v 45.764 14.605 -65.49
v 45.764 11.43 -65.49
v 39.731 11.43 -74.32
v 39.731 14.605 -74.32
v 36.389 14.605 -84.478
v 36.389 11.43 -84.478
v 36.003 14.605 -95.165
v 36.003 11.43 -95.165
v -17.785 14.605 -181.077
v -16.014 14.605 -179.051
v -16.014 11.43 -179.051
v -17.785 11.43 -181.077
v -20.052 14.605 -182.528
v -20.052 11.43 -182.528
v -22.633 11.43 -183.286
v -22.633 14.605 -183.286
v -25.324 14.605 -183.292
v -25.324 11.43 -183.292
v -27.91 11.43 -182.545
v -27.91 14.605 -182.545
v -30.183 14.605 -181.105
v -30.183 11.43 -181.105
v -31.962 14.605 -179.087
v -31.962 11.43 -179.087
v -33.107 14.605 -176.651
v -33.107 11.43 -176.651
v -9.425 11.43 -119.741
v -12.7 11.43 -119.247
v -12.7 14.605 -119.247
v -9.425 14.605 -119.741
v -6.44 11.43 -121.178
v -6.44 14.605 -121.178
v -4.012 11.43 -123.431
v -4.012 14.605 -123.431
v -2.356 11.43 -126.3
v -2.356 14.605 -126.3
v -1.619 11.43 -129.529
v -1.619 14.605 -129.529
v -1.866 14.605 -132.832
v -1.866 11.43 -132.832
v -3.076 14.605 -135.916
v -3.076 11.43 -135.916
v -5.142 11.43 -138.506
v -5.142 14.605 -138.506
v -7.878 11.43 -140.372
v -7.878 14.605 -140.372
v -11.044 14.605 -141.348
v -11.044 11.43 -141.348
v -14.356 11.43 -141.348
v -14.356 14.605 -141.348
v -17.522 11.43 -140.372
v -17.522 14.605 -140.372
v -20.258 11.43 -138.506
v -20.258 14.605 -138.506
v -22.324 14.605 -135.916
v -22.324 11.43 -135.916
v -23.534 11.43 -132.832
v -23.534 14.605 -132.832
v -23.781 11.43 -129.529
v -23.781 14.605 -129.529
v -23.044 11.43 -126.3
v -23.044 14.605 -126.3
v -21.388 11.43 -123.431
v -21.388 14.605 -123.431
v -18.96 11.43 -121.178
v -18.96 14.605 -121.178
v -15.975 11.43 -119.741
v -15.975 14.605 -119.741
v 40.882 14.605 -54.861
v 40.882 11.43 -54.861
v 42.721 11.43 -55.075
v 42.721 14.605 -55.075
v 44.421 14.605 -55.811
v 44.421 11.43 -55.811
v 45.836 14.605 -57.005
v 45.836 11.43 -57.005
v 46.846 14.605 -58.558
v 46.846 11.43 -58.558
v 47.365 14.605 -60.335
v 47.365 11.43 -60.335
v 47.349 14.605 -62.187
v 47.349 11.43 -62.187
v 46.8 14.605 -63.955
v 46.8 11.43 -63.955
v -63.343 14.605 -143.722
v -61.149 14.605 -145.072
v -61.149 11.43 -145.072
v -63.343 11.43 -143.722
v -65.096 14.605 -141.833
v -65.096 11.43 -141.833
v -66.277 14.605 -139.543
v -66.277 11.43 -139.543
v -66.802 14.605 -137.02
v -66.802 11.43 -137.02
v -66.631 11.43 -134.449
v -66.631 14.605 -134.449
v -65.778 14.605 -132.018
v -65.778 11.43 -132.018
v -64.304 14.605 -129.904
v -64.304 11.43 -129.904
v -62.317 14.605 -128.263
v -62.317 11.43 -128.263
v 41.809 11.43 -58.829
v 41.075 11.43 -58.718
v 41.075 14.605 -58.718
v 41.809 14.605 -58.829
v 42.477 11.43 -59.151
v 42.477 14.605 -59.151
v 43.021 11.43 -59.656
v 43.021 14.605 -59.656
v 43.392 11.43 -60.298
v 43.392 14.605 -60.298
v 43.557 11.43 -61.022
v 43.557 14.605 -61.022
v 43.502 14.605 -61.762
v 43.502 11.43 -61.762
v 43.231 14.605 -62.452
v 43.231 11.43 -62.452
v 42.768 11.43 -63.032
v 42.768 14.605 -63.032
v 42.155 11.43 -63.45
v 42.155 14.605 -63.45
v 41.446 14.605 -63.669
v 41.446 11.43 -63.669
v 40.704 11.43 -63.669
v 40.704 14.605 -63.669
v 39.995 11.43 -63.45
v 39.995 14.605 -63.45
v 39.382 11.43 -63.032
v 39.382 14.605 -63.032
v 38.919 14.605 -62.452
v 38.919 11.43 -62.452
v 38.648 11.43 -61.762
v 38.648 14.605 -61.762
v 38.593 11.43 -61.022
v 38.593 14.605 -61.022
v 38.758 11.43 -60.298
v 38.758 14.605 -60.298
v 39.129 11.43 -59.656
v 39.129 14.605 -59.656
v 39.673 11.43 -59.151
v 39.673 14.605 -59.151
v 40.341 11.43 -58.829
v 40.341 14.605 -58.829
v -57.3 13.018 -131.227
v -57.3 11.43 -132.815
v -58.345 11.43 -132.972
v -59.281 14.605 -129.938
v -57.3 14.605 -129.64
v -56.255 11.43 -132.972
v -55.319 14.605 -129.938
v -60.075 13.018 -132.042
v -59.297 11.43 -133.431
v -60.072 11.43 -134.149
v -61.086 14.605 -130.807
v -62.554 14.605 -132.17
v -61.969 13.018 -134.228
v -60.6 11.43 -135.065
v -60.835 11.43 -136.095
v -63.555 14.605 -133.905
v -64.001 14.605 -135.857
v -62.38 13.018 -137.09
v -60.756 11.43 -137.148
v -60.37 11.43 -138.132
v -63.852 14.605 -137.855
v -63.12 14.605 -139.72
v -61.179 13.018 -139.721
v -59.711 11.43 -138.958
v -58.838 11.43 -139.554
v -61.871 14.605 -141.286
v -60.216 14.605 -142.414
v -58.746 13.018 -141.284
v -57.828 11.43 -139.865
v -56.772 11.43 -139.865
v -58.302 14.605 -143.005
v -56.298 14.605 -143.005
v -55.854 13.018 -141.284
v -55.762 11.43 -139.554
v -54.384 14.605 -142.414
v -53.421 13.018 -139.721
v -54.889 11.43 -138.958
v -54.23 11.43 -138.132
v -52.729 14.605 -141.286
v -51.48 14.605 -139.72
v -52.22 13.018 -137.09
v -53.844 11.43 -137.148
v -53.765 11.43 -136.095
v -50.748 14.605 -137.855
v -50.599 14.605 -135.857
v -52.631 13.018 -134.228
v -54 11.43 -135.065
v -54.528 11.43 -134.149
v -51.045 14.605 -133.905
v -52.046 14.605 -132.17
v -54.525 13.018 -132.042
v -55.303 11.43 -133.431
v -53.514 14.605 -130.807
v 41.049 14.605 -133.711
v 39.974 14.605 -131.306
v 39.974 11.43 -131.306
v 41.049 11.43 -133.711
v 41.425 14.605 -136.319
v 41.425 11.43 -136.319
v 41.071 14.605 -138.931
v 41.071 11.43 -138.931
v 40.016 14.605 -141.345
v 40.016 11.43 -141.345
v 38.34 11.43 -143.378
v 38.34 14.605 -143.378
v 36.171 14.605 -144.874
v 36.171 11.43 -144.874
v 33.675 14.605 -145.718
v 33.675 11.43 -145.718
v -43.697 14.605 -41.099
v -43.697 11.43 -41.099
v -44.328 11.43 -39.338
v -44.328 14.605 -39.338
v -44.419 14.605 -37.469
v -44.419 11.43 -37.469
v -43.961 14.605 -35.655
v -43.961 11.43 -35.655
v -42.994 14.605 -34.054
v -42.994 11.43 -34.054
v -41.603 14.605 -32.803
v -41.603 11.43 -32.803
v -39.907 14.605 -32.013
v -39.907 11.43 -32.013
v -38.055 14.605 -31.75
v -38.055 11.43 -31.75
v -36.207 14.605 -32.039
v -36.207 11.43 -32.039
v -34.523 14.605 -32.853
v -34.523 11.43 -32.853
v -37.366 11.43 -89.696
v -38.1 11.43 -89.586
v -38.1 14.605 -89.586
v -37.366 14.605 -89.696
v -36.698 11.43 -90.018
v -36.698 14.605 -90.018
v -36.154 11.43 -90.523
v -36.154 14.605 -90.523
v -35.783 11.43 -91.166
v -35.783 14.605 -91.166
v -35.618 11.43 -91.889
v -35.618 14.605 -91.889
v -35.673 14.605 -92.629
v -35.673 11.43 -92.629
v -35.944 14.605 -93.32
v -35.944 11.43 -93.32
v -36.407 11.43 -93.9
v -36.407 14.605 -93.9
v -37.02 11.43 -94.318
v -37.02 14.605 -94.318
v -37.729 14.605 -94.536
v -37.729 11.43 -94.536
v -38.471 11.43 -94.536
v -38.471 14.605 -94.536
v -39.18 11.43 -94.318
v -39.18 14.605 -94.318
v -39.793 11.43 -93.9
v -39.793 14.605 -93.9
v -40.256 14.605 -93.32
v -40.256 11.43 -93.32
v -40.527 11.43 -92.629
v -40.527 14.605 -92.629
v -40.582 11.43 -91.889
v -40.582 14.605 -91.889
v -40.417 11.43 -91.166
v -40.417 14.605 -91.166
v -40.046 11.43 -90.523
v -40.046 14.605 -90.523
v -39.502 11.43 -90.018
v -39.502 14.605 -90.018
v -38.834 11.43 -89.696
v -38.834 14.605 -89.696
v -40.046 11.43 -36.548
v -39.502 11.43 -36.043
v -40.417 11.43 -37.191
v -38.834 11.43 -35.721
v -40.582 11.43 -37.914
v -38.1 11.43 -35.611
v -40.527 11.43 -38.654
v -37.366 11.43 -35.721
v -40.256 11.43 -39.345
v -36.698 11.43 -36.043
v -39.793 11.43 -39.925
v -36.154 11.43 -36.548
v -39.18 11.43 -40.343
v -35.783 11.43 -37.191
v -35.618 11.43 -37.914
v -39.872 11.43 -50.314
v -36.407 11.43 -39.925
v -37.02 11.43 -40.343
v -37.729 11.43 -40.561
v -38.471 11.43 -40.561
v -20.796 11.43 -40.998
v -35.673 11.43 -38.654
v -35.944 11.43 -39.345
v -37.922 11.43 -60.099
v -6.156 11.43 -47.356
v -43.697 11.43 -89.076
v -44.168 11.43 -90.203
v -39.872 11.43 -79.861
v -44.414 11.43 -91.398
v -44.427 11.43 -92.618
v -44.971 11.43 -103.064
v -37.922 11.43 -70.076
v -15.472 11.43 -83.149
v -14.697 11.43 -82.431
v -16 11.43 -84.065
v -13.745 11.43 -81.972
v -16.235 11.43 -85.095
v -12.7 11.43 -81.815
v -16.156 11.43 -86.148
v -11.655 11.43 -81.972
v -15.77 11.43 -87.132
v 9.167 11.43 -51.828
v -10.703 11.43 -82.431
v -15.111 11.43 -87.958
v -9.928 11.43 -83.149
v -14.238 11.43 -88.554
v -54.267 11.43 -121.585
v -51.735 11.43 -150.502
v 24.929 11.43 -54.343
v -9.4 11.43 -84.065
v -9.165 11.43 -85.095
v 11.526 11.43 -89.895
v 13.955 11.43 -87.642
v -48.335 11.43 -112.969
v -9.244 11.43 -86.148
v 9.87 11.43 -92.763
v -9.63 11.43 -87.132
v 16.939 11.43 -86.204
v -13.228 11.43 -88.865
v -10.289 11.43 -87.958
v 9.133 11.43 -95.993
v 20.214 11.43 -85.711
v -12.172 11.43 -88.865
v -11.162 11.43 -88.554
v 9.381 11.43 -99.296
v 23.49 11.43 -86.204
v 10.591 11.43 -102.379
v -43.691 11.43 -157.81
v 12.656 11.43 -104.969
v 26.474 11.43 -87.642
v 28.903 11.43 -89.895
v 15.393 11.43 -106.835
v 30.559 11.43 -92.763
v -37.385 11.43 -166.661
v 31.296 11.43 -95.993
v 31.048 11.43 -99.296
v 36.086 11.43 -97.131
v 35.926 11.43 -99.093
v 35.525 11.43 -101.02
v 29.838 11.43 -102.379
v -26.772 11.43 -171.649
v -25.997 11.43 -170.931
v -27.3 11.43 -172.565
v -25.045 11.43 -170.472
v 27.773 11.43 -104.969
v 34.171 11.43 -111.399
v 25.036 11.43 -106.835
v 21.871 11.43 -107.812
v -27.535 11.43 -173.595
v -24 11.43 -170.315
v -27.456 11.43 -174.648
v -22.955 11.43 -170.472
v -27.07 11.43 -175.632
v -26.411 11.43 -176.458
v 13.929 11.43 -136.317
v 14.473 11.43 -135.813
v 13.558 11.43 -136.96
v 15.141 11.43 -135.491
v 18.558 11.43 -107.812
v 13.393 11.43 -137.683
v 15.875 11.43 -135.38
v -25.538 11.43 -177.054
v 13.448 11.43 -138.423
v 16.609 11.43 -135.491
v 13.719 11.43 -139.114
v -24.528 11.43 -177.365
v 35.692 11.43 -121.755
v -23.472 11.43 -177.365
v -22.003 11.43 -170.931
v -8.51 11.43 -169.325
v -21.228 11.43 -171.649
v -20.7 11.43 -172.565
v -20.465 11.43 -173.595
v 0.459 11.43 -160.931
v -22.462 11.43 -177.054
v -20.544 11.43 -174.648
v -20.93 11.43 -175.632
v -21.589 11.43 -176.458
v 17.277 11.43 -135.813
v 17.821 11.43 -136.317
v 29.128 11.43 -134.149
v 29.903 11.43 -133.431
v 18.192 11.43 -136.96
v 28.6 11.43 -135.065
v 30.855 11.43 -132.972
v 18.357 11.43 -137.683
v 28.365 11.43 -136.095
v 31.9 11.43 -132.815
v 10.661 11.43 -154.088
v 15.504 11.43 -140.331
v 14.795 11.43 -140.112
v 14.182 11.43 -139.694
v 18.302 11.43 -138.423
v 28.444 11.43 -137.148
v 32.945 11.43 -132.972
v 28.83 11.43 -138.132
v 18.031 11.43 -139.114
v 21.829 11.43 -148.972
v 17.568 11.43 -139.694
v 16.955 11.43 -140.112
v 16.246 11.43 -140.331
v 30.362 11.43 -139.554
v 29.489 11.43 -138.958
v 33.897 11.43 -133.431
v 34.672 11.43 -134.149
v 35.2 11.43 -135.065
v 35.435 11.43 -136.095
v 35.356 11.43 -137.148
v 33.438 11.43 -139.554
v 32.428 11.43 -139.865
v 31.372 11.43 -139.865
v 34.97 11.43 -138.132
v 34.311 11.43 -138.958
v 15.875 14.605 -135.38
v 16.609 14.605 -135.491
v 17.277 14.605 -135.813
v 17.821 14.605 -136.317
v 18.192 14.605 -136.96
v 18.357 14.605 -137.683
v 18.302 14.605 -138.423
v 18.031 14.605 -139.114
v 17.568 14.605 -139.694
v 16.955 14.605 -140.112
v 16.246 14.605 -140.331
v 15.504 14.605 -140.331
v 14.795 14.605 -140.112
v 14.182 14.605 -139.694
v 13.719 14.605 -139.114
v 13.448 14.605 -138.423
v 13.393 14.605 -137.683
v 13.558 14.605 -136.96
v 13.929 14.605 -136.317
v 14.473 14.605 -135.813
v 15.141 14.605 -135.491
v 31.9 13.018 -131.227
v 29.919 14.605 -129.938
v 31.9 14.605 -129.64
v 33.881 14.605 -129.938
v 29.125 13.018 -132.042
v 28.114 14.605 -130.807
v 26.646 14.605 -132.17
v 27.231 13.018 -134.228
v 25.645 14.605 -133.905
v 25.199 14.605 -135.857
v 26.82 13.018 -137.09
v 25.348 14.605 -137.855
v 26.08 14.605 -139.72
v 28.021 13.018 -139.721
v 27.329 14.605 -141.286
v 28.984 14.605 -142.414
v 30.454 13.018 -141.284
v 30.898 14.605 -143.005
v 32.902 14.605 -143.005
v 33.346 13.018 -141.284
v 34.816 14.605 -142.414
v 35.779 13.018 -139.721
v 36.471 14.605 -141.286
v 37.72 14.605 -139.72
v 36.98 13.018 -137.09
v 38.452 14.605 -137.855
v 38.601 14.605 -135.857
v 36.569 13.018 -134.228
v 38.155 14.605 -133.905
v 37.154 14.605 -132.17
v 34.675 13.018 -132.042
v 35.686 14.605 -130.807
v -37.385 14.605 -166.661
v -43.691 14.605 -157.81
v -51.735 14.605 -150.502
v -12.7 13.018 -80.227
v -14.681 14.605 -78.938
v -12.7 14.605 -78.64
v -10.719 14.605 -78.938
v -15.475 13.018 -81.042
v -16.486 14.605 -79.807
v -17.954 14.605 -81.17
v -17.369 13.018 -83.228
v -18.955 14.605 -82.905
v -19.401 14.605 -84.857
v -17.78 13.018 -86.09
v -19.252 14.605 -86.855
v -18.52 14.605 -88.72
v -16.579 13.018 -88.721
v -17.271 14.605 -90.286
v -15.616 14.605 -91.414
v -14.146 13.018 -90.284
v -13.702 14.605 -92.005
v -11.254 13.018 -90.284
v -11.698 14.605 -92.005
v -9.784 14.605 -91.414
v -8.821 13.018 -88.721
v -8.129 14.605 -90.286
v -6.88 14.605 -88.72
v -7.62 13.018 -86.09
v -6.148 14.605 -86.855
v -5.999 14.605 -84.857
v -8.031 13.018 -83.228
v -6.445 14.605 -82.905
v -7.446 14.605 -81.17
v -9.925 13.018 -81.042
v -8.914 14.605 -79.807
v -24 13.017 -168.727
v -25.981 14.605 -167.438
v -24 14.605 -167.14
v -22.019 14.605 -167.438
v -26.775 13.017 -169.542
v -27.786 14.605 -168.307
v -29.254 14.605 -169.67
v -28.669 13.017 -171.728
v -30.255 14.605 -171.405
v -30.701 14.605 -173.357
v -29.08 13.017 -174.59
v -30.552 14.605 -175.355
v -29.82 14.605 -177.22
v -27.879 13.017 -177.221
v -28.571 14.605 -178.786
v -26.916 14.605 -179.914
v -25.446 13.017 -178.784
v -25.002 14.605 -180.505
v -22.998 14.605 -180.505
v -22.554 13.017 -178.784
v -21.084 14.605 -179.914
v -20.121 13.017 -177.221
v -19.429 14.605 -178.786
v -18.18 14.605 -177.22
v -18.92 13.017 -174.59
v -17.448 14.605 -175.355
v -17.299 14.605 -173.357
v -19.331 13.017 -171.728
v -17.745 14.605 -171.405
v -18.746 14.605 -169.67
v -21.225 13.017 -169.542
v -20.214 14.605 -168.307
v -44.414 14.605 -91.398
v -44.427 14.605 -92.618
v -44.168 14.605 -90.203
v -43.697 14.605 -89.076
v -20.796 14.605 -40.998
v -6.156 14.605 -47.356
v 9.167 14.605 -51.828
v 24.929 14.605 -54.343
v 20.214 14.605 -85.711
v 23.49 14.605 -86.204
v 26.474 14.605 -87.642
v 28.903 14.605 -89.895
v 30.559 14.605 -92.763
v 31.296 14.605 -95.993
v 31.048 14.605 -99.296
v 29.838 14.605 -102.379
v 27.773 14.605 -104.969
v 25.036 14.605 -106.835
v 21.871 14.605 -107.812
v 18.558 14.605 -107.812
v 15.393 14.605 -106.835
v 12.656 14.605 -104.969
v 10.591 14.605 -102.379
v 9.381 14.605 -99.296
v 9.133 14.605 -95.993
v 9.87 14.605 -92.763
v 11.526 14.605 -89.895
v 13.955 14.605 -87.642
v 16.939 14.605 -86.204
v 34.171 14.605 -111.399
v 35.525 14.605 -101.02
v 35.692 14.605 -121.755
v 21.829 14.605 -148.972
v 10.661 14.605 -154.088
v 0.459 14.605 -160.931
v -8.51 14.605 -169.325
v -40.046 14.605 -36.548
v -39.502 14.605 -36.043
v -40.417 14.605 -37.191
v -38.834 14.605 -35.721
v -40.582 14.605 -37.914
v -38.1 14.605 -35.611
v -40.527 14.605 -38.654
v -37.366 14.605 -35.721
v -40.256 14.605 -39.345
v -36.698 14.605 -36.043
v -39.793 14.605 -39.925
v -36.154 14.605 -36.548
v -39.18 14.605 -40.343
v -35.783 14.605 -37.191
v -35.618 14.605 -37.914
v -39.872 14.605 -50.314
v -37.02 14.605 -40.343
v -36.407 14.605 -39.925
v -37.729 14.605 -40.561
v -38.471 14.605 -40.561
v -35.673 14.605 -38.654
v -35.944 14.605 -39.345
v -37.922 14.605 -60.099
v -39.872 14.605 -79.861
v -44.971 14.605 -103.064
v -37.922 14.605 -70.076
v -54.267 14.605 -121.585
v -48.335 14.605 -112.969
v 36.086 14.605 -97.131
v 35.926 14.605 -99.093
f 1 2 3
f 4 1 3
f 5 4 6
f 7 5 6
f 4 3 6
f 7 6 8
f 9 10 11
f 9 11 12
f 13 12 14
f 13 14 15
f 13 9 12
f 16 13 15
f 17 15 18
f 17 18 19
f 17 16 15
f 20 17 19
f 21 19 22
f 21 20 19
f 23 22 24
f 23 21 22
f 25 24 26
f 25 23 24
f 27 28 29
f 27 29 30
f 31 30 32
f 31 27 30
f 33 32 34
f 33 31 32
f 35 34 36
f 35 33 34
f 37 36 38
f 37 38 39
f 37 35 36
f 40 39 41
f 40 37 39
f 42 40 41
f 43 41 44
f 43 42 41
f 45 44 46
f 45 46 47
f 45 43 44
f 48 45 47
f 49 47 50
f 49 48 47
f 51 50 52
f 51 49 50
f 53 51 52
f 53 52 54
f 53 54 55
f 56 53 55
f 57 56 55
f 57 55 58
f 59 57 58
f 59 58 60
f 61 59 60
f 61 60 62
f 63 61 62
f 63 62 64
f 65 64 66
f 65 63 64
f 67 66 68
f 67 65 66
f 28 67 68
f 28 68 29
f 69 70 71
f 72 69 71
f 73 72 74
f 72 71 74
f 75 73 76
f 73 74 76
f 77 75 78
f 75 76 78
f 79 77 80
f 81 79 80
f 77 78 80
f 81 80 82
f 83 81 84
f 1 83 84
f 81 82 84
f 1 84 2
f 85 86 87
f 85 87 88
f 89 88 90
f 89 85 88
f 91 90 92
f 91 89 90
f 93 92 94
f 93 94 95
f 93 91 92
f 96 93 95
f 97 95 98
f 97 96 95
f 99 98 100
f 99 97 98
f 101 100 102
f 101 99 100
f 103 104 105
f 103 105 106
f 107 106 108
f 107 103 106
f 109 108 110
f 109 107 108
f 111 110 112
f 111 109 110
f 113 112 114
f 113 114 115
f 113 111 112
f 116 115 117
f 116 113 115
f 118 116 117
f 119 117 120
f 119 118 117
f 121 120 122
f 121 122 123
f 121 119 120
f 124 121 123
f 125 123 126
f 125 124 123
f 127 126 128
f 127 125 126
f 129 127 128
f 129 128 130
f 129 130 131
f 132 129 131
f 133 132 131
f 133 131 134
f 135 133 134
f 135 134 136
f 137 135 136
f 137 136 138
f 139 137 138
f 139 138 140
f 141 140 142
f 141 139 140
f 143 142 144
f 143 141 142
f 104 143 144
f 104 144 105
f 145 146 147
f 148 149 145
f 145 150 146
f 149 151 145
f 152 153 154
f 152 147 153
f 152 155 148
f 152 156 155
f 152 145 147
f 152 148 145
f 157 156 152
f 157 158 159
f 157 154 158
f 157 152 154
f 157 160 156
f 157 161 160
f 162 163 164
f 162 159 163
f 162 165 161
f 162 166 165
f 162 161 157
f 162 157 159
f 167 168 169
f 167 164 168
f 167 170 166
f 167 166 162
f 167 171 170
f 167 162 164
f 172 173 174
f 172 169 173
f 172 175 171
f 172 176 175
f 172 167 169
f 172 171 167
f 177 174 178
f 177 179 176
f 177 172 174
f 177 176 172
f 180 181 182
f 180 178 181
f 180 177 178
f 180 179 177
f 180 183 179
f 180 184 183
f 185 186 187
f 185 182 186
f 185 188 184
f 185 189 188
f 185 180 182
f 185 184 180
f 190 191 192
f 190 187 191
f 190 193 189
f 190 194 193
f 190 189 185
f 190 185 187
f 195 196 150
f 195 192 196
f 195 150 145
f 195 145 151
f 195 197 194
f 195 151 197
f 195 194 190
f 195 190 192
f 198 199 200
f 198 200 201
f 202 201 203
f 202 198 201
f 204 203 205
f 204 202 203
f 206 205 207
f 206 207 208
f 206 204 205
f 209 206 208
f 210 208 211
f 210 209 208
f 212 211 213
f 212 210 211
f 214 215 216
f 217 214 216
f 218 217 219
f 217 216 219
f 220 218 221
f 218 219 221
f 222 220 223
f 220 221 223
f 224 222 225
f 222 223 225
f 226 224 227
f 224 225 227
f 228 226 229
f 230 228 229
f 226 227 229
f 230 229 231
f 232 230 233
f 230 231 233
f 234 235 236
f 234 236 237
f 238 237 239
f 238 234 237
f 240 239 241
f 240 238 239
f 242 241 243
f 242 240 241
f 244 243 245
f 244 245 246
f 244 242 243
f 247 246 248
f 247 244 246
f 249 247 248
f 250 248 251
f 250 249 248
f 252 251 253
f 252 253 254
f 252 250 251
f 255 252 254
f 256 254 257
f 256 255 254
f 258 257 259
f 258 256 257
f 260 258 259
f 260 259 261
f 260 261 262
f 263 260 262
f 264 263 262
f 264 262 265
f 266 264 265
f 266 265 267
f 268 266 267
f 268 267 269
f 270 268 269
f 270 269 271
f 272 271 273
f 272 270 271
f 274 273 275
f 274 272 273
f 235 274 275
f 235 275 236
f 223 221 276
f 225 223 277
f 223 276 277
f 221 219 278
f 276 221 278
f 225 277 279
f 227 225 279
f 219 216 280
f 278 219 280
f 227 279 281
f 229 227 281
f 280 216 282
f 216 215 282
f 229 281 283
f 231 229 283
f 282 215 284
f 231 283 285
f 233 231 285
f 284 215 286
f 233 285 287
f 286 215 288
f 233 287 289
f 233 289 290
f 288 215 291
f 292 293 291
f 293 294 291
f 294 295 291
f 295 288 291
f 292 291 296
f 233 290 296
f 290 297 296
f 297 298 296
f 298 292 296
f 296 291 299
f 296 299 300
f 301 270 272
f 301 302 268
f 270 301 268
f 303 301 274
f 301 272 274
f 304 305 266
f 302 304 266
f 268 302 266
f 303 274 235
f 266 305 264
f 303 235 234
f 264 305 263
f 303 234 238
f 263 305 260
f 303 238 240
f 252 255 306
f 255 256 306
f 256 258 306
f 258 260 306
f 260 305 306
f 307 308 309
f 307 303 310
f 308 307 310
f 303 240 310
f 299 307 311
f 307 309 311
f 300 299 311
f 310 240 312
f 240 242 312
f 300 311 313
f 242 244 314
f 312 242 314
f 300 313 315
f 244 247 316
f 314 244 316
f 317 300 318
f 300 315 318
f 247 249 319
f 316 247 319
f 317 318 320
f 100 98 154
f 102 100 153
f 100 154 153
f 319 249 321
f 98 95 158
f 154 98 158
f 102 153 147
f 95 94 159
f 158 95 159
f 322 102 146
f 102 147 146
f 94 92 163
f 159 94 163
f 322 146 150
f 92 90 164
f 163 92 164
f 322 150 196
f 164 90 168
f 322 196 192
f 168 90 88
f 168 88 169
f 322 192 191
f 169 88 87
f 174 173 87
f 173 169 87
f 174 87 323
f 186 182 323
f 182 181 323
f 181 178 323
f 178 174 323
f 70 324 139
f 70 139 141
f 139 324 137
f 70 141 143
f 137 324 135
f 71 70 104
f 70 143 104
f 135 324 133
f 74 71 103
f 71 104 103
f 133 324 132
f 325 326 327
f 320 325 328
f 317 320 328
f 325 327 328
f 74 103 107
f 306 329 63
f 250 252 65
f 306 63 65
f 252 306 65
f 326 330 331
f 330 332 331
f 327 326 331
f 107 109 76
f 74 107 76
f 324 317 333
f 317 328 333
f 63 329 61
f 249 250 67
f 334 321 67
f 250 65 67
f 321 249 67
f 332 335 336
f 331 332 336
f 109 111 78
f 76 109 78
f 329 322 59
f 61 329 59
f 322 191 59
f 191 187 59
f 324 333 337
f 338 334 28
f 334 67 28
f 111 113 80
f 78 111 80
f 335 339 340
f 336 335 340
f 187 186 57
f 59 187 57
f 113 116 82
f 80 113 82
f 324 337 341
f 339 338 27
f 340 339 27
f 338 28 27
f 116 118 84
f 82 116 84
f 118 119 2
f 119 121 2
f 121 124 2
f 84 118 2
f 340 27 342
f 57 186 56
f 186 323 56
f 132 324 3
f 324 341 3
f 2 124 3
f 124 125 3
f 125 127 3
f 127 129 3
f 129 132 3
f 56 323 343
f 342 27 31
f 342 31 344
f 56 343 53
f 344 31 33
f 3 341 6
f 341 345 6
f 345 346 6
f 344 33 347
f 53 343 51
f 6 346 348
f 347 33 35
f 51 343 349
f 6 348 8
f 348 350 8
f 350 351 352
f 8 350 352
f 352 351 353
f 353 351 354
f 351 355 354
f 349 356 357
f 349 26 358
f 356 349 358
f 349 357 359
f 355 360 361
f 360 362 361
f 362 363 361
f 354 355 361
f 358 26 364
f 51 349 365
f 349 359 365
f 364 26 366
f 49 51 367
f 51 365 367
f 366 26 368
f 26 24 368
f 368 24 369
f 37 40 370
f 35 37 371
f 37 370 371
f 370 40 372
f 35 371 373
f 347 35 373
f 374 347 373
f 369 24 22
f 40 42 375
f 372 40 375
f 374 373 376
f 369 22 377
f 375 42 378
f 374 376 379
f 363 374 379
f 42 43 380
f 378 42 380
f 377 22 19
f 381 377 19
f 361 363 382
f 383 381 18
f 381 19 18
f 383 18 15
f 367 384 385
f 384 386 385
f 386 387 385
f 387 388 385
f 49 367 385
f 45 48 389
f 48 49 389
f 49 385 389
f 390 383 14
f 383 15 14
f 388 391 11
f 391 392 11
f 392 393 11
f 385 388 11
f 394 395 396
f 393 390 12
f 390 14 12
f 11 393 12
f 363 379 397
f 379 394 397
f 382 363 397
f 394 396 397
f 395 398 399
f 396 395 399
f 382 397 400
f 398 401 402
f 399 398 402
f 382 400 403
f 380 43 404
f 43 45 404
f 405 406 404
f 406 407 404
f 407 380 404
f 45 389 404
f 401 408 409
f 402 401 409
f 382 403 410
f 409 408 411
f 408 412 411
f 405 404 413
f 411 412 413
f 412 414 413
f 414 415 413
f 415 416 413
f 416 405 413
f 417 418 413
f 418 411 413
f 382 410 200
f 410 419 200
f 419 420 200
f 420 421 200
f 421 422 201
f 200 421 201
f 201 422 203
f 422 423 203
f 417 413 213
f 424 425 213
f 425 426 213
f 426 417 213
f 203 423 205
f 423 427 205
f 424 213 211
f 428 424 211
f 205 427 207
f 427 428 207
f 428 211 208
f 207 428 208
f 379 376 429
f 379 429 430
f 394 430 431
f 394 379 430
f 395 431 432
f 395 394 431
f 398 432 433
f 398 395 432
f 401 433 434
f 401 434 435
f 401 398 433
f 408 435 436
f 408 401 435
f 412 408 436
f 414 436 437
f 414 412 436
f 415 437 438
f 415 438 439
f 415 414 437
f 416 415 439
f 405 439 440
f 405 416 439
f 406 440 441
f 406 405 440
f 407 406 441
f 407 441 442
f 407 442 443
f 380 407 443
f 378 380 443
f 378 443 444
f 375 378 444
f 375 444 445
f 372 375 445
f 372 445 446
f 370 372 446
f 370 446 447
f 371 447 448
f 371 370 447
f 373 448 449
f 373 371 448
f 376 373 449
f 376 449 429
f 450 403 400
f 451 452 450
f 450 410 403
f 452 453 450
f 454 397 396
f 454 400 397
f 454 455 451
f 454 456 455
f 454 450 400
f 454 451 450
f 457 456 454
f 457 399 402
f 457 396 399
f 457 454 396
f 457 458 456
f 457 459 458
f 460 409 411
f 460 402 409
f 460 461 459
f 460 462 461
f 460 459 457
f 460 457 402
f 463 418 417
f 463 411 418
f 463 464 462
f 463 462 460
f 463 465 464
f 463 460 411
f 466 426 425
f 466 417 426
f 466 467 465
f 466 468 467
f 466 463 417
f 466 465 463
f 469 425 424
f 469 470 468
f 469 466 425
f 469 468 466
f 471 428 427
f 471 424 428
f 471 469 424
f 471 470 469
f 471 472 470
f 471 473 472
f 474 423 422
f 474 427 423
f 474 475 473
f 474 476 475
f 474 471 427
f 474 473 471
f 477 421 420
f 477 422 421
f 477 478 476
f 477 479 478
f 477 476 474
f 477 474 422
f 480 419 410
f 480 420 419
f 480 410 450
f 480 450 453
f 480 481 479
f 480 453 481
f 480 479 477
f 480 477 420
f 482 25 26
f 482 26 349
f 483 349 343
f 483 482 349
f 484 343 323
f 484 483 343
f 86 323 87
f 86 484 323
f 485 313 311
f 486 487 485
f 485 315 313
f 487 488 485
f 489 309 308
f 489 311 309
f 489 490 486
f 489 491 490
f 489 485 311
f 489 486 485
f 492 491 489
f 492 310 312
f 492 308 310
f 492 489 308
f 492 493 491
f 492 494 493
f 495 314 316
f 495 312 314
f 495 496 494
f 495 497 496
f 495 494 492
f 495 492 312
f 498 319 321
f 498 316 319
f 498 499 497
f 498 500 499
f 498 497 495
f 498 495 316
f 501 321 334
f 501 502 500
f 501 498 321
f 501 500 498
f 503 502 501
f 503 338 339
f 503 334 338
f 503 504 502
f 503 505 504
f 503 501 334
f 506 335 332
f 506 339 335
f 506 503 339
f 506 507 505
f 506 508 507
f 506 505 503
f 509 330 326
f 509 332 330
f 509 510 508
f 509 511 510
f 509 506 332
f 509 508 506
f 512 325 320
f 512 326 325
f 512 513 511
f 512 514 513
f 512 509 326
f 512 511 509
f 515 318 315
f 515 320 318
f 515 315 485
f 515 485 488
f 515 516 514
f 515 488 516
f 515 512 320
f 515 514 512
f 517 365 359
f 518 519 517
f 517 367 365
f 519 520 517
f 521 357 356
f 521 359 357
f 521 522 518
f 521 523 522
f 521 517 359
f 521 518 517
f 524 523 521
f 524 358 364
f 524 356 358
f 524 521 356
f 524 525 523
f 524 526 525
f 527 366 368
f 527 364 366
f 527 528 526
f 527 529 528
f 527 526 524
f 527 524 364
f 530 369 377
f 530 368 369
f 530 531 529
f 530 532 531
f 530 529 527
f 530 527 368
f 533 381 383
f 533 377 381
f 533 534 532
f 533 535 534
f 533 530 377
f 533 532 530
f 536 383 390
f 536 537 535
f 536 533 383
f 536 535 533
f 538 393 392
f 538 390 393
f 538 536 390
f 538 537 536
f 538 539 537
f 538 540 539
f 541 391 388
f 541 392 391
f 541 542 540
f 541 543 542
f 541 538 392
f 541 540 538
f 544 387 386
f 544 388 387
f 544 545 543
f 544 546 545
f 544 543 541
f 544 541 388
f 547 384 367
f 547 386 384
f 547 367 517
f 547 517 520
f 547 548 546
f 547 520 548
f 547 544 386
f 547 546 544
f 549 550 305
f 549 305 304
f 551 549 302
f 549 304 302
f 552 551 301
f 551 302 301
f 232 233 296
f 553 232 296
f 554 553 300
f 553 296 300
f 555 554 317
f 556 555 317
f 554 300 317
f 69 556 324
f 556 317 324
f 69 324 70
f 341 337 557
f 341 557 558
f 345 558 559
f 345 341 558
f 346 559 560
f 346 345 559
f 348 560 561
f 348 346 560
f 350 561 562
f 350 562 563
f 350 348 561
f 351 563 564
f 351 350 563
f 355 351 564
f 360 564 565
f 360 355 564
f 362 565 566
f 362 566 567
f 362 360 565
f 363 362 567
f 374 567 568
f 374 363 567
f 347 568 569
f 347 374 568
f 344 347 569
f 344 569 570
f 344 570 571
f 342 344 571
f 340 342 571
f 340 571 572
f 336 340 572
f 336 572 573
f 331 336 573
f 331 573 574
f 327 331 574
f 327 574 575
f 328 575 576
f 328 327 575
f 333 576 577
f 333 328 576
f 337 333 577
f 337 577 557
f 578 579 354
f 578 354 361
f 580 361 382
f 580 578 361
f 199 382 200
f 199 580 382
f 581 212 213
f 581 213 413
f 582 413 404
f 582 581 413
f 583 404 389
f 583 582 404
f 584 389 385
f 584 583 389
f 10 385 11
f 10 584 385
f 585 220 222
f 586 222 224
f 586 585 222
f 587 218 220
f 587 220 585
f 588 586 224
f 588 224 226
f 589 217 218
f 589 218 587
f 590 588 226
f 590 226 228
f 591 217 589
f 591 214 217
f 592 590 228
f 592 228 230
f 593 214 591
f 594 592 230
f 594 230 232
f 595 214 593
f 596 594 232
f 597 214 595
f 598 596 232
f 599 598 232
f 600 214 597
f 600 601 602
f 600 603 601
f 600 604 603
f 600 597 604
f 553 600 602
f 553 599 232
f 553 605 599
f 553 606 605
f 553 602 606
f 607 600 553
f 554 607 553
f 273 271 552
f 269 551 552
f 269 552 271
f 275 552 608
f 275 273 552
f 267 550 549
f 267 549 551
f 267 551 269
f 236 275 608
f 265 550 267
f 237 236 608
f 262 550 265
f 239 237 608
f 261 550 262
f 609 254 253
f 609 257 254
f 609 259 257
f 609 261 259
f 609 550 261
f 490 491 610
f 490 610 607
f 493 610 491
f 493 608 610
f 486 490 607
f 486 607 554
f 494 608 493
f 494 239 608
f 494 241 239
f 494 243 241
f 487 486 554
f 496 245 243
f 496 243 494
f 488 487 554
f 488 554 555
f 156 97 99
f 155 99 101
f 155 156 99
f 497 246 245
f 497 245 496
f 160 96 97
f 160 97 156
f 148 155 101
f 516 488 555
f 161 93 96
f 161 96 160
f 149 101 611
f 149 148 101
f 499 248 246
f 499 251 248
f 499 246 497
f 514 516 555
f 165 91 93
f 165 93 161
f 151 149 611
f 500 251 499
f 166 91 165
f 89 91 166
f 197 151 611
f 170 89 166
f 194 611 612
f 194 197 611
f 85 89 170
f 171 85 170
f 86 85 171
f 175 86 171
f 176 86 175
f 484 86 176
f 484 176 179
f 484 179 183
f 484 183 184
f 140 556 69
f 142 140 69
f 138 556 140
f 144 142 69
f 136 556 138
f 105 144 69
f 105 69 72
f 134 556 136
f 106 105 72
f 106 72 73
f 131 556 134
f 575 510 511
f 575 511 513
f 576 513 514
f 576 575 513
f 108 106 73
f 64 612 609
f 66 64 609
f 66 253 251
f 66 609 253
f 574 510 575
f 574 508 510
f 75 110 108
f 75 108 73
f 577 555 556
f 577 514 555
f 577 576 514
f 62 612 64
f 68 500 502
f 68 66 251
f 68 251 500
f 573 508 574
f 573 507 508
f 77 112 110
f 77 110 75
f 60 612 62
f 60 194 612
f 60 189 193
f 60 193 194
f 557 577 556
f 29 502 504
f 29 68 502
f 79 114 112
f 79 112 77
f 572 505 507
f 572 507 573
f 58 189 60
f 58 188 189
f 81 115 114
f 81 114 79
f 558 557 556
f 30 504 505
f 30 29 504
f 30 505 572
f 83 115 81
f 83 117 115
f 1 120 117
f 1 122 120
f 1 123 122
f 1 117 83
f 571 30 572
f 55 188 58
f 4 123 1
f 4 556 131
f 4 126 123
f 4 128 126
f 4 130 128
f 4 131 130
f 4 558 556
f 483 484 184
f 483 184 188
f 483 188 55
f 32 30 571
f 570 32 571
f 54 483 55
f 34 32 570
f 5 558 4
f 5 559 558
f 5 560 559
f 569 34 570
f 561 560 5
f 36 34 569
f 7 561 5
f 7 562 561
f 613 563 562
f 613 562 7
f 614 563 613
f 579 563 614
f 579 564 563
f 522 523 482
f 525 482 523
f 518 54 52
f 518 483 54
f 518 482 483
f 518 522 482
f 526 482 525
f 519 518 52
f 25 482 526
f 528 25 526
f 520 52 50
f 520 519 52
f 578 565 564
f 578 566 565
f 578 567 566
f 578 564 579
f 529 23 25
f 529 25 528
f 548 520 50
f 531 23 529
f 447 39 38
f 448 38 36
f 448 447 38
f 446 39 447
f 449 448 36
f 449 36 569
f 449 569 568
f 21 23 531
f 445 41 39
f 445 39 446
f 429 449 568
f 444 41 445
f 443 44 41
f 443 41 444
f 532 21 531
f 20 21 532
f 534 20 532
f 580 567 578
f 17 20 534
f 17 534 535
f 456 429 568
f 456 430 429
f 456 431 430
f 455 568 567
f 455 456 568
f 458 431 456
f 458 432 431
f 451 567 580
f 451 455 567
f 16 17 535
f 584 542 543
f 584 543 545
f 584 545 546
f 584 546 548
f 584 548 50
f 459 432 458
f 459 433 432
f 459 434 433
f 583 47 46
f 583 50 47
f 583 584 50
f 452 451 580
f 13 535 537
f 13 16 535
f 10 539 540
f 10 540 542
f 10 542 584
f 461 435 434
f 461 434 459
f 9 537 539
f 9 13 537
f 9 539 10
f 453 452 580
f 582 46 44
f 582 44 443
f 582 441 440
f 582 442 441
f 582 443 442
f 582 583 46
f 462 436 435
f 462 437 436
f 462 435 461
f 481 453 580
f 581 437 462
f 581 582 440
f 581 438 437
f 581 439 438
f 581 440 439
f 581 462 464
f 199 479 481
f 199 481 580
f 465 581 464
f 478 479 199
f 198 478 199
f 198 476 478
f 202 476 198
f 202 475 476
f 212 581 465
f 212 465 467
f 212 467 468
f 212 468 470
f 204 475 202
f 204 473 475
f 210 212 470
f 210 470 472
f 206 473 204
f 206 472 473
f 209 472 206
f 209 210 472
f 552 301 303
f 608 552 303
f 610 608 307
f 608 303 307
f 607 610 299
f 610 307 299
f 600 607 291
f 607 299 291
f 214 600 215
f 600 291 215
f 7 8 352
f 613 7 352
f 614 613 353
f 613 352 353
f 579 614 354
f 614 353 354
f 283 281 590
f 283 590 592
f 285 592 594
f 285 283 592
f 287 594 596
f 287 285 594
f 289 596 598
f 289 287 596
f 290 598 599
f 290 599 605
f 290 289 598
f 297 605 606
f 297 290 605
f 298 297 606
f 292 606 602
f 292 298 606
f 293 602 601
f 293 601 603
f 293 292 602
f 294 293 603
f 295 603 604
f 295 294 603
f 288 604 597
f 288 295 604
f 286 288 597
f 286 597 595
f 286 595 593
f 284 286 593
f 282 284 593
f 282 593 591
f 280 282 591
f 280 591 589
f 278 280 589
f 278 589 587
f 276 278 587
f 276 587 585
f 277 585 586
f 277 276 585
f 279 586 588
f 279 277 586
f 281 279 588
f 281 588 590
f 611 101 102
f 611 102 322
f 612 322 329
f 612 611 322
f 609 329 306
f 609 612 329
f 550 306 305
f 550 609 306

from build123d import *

# Parameters (mm, degrees)
LOWEREDBALLAST_DECK_MOUNT_START       = 6.35
LOWEREDBALLAST_DECK_MOUNT_OUTLINE_R   = 2.5527
LOWEREDBALLAST_DECK_MOUNT_OUTLINE_R_2 = 2.4892
LOWEREDBALLAST_DECK_MOUNT_OUTLINE_R_3 = 8.73125
LOWEREDBALLAST_DECK_MOUNT_DEPTH       = 5.08
BODY_MOVE_COPY2_START                 = 11.43
BODY_MOVE_COPY2_OUTLINE_W             = 5.08
BODY_MOVE_COPY2_OUTLINE_H             = 241.3
BODY_MOVE_COPY2_DEPTH                 = 185.42
BODY_MOVE_COPY2_START_2               = 6.35
BODY_MOVE_COPY2_2_OUTLINE_W           = 5.08
BODY_MOVE_COPY2_2_OUTLINE_H           = 127
BODY_MOVE_COPY2_2_DEPTH               = 5.08
BODY_MOVE_COPY2_3_OUTLINE_R           = 2.5527
BODY_MOVE_COPY2_3_OUTLINE_R_2         = 2.4892
BODY_MOVE_COPY2_3_OUTLINE_R_3         = 8.73125
BODY_MOVE_COPY2_3_DEPTH               = 5.08
SKETCH2_R                             = 2.4892
SKETCH2_R_2                           = 11.1125
BOSS_EXTRUDE2_DEPTH                   = 3.175
BOSS_EXTRUDE3_DEPTH                   = 3.175
CSK_FOR_M6_SFHCS1_AT_2_COUNT          = 2
CSK_FOR_M6_SFHCS1_AT_2_PITCH          = 50.151171472
CSK_FOR_M6_SFHCS1_AT_3_COUNT          = 2
CSK_FOR_M6_SFHCS1_AT_3_PITCH          = 89.2
CSK_FOR_M6_SFHCS1_AT_4_COUNT          = 2
CSK_FOR_M6_SFHCS1_AT_4_PITCH          = 67.750719553


# Read off the part's stored shape, not the designer's step: LoweredBallast_Deck_Mount, Body-Move/Copy2
with BuildPart() as part:
    # LoweredBallast_Deck_Mount outline → LoweredBallast_Deck_Mount (new body)
    with BuildSketch(Plane.YZ.offset(LOWEREDBALLAST_DECK_MOUNT_START)):
        Polygon((6.35, -120.65), (107.712348179, -120.65), (196.85, -56.884227826), (196.85, 56.884227826), (107.712348179, 120.65), (6.35, 120.65), align=None)
        with Locations((15.875, -111.125)):
            Circle(LOWEREDBALLAST_DECK_MOUNT_OUTLINE_R, mode=Mode.SUBTRACT)
        with Locations((49.2125, -13.748153285)):
            Circle(LOWEREDBALLAST_DECK_MOUNT_OUTLINE_R, mode=Mode.SUBTRACT)
        with Locations((61.207670487, -41.07506464)):
            Circle(LOWEREDBALLAST_DECK_MOUNT_OUTLINE_R_2, mode=Mode.SUBTRACT)
        with Locations((96.823134697, -20.21447179)):
            Circle(LOWEREDBALLAST_DECK_MOUNT_OUTLINE_R_3, mode=Mode.SUBTRACT)
        with Locations((104.656174089, -111.125)):
            Circle(LOWEREDBALLAST_DECK_MOUNT_OUTLINE_R, mode=Mode.SUBTRACT)
        with Locations((137.869384338, -15.875)):
            Circle(LOWEREDBALLAST_DECK_MOUNT_OUTLINE_R_2, mode=Mode.SUBTRACT)
        with Locations((187.325, -51.986786112)):
            Circle(LOWEREDBALLAST_DECK_MOUNT_OUTLINE_R, mode=Mode.SUBTRACT)
        with Locations((15.875, 0)):
            Circle(LOWEREDBALLAST_DECK_MOUNT_OUTLINE_R, mode=Mode.SUBTRACT)
        with Locations((49.2125, 13.748153285)):
            Circle(LOWEREDBALLAST_DECK_MOUNT_OUTLINE_R, mode=Mode.SUBTRACT)
        with Locations((38.1, 38.1)):
            Circle(LOWEREDBALLAST_DECK_MOUNT_OUTLINE_R_2, mode=Mode.SUBTRACT)
        with Locations((57.15, 0)):
            Circle(LOWEREDBALLAST_DECK_MOUNT_OUTLINE_R_3, mode=Mode.SUBTRACT)
        with Locations((73.025, 0)):
            Circle(LOWEREDBALLAST_DECK_MOUNT_OUTLINE_R, mode=Mode.SUBTRACT)
        with Locations((92.075, 38.1)):
            Circle(LOWEREDBALLAST_DECK_MOUNT_OUTLINE_R_2, mode=Mode.SUBTRACT)
        with Locations((15.875, 111.125)):
            Circle(LOWEREDBALLAST_DECK_MOUNT_OUTLINE_R, mode=Mode.SUBTRACT)
        with Locations((187.325, 51.986786112)):
            Circle(LOWEREDBALLAST_DECK_MOUNT_OUTLINE_R, mode=Mode.SUBTRACT)
        with Locations((104.656174089, 111.125)):
            Circle(LOWEREDBALLAST_DECK_MOUNT_OUTLINE_R, mode=Mode.SUBTRACT)
    extrude(amount=LOWEREDBALLAST_DECK_MOUNT_DEPTH)

    # Body-Move/Copy2 outline → Body-Move/Copy2 (cut)
    with BuildSketch(Plane(origin=(0, 0, 0), x_dir=(1, 0, 0), z_dir=(0, 1, 0)).offset(BODY_MOVE_COPY2_START)):
        with Locations((8.89, 0)):
            Rectangle(BODY_MOVE_COPY2_OUTLINE_W, BODY_MOVE_COPY2_OUTLINE_H)
    extrude(amount=BODY_MOVE_COPY2_DEPTH, mode=Mode.SUBTRACT)

    # Body-Move_Copy2 2 outline → Body-Move_Copy2 2 (cut)
    with BuildSketch(Plane(origin=(0, 0, 0), x_dir=(1, 0, 0), z_dir=(0, 1, 0)).offset(BODY_MOVE_COPY2_START_2)):
        with Locations((8.89, -57.15)):
            Rectangle(BODY_MOVE_COPY2_2_OUTLINE_W, BODY_MOVE_COPY2_2_OUTLINE_H)
        with BuildLine():
            ThreePointArc((11.43, 50.281351083), (11.195453285, 49.2125), (11.43, 48.143648917))
            Line((11.43, 48.143648917), (11.43, 50.281351083))
        make_face()
        with BuildLine():
            Line((6.35, 63.142681083), (6.35, 51.157318917))
            ThreePointArc((6.35, 51.157318917), (8.73125, 57.15), (6.35, 63.142681083))
        make_face()
    extrude(amount=BODY_MOVE_COPY2_2_DEPTH, mode=Mode.SUBTRACT)

    # Body-Move_Copy2 3 outline → Body-Move_Copy2 3 (add)
    with BuildSketch(Plane(origin=(0, 0, 0), x_dir=(1, 0, 0), z_dir=(0, 1, 0)).offset(BODY_MOVE_COPY2_START_2)):
        with BuildLine():
            Line((120.65, 6.35), (120.65, 107.712348179))
            Line((120.65, 107.712348179), (56.884227826, 196.85))
            Line((56.884227826, 196.85), (-56.884227826, 196.85))
            Line((-56.884227826, 196.85), (-120.65, 107.712348179))
            Line((-120.65, 107.712348179), (-120.65, 6.35))
            Line((-120.65, 6.35), (6.35, 6.35))
            Line((6.35, 6.35), (6.35, 51.157318917))
            ThreePointArc((6.35, 51.157318917), (-8.73125, 57.15), (6.35, 63.142681083))
            Line((6.35, 63.142681083), (6.35, 120.65))
            Line((6.35, 120.65), (11.43, 120.65))
            Line((11.43, 120.65), (11.43, 50.281351083))
            ThreePointArc((11.43, 50.281351083), (16.300853285, 49.2125), (11.43, 48.143648917))
            Line((11.43, 48.143648917), (11.43, 6.35))
            Line((11.43, 6.35), (120.65, 6.35))
        make_face()
        with Locations((-111.125, 15.875)):
            Circle(BODY_MOVE_COPY2_3_OUTLINE_R, mode=Mode.SUBTRACT)
        with Locations((0, 15.875)):
            Circle(BODY_MOVE_COPY2_3_OUTLINE_R, mode=Mode.SUBTRACT)
        with Locations((111.125, 15.875)):
            Circle(BODY_MOVE_COPY2_3_OUTLINE_R, mode=Mode.SUBTRACT)
        with Locations((-111.125, 104.656174089)):
            Circle(BODY_MOVE_COPY2_3_OUTLINE_R, mode=Mode.SUBTRACT)
        with Locations((-38.1, 38.1)):
            Circle(BODY_MOVE_COPY2_3_OUTLINE_R_2, mode=Mode.SUBTRACT)
        with Locations((-13.748153285, 49.2125)):
            Circle(BODY_MOVE_COPY2_3_OUTLINE_R, mode=Mode.SUBTRACT)
        with Locations((-38.1, 92.075)):
            Circle(BODY_MOVE_COPY2_3_OUTLINE_R_2, mode=Mode.SUBTRACT)
        with Locations((-51.986786112, 187.325)):
            Circle(BODY_MOVE_COPY2_3_OUTLINE_R, mode=Mode.SUBTRACT)
        with Locations((0, 73.025)):
            Circle(BODY_MOVE_COPY2_3_OUTLINE_R, mode=Mode.SUBTRACT)
        with Locations((41.07506464, 61.207670487)):
            Circle(BODY_MOVE_COPY2_3_OUTLINE_R_2, mode=Mode.SUBTRACT)
        with Locations((20.21447179, 96.823134697)):
            Circle(BODY_MOVE_COPY2_3_OUTLINE_R_3, mode=Mode.SUBTRACT)
        with Locations((111.125, 104.656174089)):
            Circle(BODY_MOVE_COPY2_3_OUTLINE_R, mode=Mode.SUBTRACT)
        with Locations((15.875, 137.869384338)):
            Circle(BODY_MOVE_COPY2_3_OUTLINE_R_2, mode=Mode.SUBTRACT)
        with Locations((51.986786112, 187.325)):
            Circle(BODY_MOVE_COPY2_3_OUTLINE_R, mode=Mode.SUBTRACT)
    extrude(amount=BODY_MOVE_COPY2_3_DEPTH)


with BuildPart() as body_2:
    # Sketch2 → Boss-Extrude2 (new body)
    with BuildSketch(Plane(origin=(0, 11.43, 0), x_dir=(1, 0, 0), z_dir=(0, 1, 0))):
        with BuildLine():
            ThreePointArc((-43.697395055, 41.098611111), (-42.344618776, 33.377107725), (-34.523029987, 32.853307182))
            ThreePointArc((-34.523029987, 32.853307182), (1.435165075, 49.833263975), (40.88179348, 54.860612408))
            ThreePointArc((40.88179348, 54.860612408), (46.845610099, 58.557518585), (45.763526107, 65.490289905))
            ThreePointArc((45.763526107, 65.490289905), (37.701905828, 79.281344599), (36.002655059, 95.16515579))
            ThreePointArc((36.002655059, 95.16515579), (35.295571353, 101.780559529), (31.939672665, 107.525250816))
            ThreePointArc((31.939672665, 107.525250816), (23.883267234, 121.31935255), (22.19002211, 137.203805076))
            ThreePointArc((22.19002211, 137.203805076), (20.070189732, 142.636236875), (14.412445618, 144.048658946))
            ThreePointArc((14.412445618, 144.048658946), (3.462344959, 143.086426048), (-7.306729609, 145.290429122))
            ThreePointArc((-7.306729609, 145.290429122), (-22.309274144, 142.996002148), (-28.529000968, 129.152023822))
            ThreePointArc((-28.529000968, 129.152023822), (-31.43370737, 111.399097034), (-42.15980047, 96.957675511))
            ThreePointArc((-42.15980047, 96.957675511), (-44.332497578, 93.290925139), (-43.697395055, 89.076388889))
            ThreePointArc((-43.697395055, 89.076388889), (-37.676555497, 65.0875), (-43.697395055, 41.098611111))
        make_face()
        with Locations(Location((-38.1, 92.075, 0), (0, 0, 270))):
            Circle(SKETCH2_R, mode=Mode.SUBTRACT)
        with Locations(Location((15.875, 137.869384338, 0), (0, 0, 270))):
            Circle(SKETCH2_R, mode=Mode.SUBTRACT)
        with Locations(Location((41.07506464, 61.207670487, 0), (0, 0, 270))):
            Circle(SKETCH2_R, mode=Mode.SUBTRACT)
        with Locations(Location((20.21447179, 96.823134697, 0), (0, 0, 270))):
            Circle(SKETCH2_R_2, mode=Mode.SUBTRACT)
        with Locations(Location((-12.7, 130.359646842, 0), (0, 0, 270))):
            Circle(SKETCH2_R_2, mode=Mode.SUBTRACT)
        with Locations(Location((-38.1, 38.1, 0), (0, 0, 270))):
            Circle(SKETCH2_R, mode=Mode.SUBTRACT)
    extrude(amount=BOSS_EXTRUDE2_DEPTH)

    # Sketch5 → Boss-Extrude3 (add)
    with BuildSketch(Plane(origin=(0, 14.605, 0), x_dir=(1, 0, 0), z_dir=(0, 1, 0))):
        with BuildLine():
            ThreePointArc((-61.148803131, 145.072415601), (-66.802064537, 137.020248494), (-62.317406726, 128.263273904))
            ThreePointArc((-62.317406726, 128.263273904), (-48.335449579, 112.968704409), (-44.42671909, 92.618254593))
            ThreePointArc((-44.42671909, 92.618254593), (-43.728284874, 95.015222675), (-42.15980047, 96.957675511))
            ThreePointArc((-42.15980047, 96.957675511), (-31.43370737, 111.399097034), (-28.529000968, 129.152023822))
            ThreePointArc((-28.529000968, 129.152023822), (-22.309274144, 142.996002148), (-7.306729609, 145.290429122))
            ThreePointArc((-7.306729609, 145.290429122), (3.462344959, 143.086426048), (14.412445618, 144.048658946))
            ThreePointArc((14.412445618, 144.048658946), (20.070189732, 142.636236875), (22.19002211, 137.203805076))
            ThreePointArc((22.19002211, 137.203805076), (23.883267234, 121.31935255), (31.939672665, 107.525250816))
            ThreePointArc((31.939672665, 107.525250816), (34.118030208, 104.485163692), (35.524712446, 101.019818631))
            ThreePointArc((35.524712446, 101.019818631), (34.573862159, 116.629433393), (39.973858004, 131.306089488))
            ThreePointArc((39.973858004, 131.306089488), (40.627735004, 140.174390174), (33.674724287, 145.71785066))
            ThreePointArc((33.674724287, 145.71785066), (5.421674261, 157.303422607), (-16.014164602, 179.051183993))
            ThreePointArc((-16.014164602, 179.051183993), (-25.324336968, 183.292130958), (-33.106697868, 176.65136297))
            ThreePointArc((-33.106697868, 176.65136297), (-43.690598599, 157.809698398), (-61.148803131, 145.072415601))
        make_face()
    extrude(amount=-BOSS_EXTRUDE3_DEPTH)

    # Sketch7 → CSK for M6 SFHCS1 (revolve, cut)
    with BuildSketch(Plane(origin=(-57.3, 14.605, -136.359646842), x_dir=(0, 0, 1), z_dir=(1, 0, 0))):
        Polygon((0, 0), (0, 3.175), (3.3, 3.175), (3.3, 3.42), (6.72, 0), align=None)
    csk_for_m6_sfhcs1 = revolve(axis=Axis((-57.3, 20.955, -136.359646842), (0, -1, 0)), mode=Mode.SUBTRACT)

    # CSK for M6 SFHCS1 at 2: CSK for M6 SFHCS1 ×2
    with Locations(*[Vector(0.663992465633312, -2.603373438029753e-15, -0.7477392631005777) * (i * CSK_FOR_M6_SFHCS1_AT_2_PITCH) for i in range(1, CSK_FOR_M6_SFHCS1_AT_2_COUNT)]):
        add(csk_for_m6_sfhcs1, mode=Mode.SUBTRACT)

    # CSK for M6 SFHCS1 at 3: CSK for M6 SFHCS1 ×2
    with Locations(*[(i * CSK_FOR_M6_SFHCS1_AT_3_PITCH, 0, 0) for i in range(1, CSK_FOR_M6_SFHCS1_AT_3_COUNT)]):
        add(csk_for_m6_sfhcs1, mode=Mode.SUBTRACT)

    # CSK for M6 SFHCS1 at 4: CSK for M6 SFHCS1 ×2
    with Locations(*[Vector(0.6582955914566169, 2.6219010677824987e-15, 0.7527595328315564) * (i * CSK_FOR_M6_SFHCS1_AT_4_PITCH) for i in range(1, CSK_FOR_M6_SFHCS1_AT_4_COUNT)]):
        add(csk_for_m6_sfhcs1, mode=Mode.SUBTRACT)


solid = body_2.part
